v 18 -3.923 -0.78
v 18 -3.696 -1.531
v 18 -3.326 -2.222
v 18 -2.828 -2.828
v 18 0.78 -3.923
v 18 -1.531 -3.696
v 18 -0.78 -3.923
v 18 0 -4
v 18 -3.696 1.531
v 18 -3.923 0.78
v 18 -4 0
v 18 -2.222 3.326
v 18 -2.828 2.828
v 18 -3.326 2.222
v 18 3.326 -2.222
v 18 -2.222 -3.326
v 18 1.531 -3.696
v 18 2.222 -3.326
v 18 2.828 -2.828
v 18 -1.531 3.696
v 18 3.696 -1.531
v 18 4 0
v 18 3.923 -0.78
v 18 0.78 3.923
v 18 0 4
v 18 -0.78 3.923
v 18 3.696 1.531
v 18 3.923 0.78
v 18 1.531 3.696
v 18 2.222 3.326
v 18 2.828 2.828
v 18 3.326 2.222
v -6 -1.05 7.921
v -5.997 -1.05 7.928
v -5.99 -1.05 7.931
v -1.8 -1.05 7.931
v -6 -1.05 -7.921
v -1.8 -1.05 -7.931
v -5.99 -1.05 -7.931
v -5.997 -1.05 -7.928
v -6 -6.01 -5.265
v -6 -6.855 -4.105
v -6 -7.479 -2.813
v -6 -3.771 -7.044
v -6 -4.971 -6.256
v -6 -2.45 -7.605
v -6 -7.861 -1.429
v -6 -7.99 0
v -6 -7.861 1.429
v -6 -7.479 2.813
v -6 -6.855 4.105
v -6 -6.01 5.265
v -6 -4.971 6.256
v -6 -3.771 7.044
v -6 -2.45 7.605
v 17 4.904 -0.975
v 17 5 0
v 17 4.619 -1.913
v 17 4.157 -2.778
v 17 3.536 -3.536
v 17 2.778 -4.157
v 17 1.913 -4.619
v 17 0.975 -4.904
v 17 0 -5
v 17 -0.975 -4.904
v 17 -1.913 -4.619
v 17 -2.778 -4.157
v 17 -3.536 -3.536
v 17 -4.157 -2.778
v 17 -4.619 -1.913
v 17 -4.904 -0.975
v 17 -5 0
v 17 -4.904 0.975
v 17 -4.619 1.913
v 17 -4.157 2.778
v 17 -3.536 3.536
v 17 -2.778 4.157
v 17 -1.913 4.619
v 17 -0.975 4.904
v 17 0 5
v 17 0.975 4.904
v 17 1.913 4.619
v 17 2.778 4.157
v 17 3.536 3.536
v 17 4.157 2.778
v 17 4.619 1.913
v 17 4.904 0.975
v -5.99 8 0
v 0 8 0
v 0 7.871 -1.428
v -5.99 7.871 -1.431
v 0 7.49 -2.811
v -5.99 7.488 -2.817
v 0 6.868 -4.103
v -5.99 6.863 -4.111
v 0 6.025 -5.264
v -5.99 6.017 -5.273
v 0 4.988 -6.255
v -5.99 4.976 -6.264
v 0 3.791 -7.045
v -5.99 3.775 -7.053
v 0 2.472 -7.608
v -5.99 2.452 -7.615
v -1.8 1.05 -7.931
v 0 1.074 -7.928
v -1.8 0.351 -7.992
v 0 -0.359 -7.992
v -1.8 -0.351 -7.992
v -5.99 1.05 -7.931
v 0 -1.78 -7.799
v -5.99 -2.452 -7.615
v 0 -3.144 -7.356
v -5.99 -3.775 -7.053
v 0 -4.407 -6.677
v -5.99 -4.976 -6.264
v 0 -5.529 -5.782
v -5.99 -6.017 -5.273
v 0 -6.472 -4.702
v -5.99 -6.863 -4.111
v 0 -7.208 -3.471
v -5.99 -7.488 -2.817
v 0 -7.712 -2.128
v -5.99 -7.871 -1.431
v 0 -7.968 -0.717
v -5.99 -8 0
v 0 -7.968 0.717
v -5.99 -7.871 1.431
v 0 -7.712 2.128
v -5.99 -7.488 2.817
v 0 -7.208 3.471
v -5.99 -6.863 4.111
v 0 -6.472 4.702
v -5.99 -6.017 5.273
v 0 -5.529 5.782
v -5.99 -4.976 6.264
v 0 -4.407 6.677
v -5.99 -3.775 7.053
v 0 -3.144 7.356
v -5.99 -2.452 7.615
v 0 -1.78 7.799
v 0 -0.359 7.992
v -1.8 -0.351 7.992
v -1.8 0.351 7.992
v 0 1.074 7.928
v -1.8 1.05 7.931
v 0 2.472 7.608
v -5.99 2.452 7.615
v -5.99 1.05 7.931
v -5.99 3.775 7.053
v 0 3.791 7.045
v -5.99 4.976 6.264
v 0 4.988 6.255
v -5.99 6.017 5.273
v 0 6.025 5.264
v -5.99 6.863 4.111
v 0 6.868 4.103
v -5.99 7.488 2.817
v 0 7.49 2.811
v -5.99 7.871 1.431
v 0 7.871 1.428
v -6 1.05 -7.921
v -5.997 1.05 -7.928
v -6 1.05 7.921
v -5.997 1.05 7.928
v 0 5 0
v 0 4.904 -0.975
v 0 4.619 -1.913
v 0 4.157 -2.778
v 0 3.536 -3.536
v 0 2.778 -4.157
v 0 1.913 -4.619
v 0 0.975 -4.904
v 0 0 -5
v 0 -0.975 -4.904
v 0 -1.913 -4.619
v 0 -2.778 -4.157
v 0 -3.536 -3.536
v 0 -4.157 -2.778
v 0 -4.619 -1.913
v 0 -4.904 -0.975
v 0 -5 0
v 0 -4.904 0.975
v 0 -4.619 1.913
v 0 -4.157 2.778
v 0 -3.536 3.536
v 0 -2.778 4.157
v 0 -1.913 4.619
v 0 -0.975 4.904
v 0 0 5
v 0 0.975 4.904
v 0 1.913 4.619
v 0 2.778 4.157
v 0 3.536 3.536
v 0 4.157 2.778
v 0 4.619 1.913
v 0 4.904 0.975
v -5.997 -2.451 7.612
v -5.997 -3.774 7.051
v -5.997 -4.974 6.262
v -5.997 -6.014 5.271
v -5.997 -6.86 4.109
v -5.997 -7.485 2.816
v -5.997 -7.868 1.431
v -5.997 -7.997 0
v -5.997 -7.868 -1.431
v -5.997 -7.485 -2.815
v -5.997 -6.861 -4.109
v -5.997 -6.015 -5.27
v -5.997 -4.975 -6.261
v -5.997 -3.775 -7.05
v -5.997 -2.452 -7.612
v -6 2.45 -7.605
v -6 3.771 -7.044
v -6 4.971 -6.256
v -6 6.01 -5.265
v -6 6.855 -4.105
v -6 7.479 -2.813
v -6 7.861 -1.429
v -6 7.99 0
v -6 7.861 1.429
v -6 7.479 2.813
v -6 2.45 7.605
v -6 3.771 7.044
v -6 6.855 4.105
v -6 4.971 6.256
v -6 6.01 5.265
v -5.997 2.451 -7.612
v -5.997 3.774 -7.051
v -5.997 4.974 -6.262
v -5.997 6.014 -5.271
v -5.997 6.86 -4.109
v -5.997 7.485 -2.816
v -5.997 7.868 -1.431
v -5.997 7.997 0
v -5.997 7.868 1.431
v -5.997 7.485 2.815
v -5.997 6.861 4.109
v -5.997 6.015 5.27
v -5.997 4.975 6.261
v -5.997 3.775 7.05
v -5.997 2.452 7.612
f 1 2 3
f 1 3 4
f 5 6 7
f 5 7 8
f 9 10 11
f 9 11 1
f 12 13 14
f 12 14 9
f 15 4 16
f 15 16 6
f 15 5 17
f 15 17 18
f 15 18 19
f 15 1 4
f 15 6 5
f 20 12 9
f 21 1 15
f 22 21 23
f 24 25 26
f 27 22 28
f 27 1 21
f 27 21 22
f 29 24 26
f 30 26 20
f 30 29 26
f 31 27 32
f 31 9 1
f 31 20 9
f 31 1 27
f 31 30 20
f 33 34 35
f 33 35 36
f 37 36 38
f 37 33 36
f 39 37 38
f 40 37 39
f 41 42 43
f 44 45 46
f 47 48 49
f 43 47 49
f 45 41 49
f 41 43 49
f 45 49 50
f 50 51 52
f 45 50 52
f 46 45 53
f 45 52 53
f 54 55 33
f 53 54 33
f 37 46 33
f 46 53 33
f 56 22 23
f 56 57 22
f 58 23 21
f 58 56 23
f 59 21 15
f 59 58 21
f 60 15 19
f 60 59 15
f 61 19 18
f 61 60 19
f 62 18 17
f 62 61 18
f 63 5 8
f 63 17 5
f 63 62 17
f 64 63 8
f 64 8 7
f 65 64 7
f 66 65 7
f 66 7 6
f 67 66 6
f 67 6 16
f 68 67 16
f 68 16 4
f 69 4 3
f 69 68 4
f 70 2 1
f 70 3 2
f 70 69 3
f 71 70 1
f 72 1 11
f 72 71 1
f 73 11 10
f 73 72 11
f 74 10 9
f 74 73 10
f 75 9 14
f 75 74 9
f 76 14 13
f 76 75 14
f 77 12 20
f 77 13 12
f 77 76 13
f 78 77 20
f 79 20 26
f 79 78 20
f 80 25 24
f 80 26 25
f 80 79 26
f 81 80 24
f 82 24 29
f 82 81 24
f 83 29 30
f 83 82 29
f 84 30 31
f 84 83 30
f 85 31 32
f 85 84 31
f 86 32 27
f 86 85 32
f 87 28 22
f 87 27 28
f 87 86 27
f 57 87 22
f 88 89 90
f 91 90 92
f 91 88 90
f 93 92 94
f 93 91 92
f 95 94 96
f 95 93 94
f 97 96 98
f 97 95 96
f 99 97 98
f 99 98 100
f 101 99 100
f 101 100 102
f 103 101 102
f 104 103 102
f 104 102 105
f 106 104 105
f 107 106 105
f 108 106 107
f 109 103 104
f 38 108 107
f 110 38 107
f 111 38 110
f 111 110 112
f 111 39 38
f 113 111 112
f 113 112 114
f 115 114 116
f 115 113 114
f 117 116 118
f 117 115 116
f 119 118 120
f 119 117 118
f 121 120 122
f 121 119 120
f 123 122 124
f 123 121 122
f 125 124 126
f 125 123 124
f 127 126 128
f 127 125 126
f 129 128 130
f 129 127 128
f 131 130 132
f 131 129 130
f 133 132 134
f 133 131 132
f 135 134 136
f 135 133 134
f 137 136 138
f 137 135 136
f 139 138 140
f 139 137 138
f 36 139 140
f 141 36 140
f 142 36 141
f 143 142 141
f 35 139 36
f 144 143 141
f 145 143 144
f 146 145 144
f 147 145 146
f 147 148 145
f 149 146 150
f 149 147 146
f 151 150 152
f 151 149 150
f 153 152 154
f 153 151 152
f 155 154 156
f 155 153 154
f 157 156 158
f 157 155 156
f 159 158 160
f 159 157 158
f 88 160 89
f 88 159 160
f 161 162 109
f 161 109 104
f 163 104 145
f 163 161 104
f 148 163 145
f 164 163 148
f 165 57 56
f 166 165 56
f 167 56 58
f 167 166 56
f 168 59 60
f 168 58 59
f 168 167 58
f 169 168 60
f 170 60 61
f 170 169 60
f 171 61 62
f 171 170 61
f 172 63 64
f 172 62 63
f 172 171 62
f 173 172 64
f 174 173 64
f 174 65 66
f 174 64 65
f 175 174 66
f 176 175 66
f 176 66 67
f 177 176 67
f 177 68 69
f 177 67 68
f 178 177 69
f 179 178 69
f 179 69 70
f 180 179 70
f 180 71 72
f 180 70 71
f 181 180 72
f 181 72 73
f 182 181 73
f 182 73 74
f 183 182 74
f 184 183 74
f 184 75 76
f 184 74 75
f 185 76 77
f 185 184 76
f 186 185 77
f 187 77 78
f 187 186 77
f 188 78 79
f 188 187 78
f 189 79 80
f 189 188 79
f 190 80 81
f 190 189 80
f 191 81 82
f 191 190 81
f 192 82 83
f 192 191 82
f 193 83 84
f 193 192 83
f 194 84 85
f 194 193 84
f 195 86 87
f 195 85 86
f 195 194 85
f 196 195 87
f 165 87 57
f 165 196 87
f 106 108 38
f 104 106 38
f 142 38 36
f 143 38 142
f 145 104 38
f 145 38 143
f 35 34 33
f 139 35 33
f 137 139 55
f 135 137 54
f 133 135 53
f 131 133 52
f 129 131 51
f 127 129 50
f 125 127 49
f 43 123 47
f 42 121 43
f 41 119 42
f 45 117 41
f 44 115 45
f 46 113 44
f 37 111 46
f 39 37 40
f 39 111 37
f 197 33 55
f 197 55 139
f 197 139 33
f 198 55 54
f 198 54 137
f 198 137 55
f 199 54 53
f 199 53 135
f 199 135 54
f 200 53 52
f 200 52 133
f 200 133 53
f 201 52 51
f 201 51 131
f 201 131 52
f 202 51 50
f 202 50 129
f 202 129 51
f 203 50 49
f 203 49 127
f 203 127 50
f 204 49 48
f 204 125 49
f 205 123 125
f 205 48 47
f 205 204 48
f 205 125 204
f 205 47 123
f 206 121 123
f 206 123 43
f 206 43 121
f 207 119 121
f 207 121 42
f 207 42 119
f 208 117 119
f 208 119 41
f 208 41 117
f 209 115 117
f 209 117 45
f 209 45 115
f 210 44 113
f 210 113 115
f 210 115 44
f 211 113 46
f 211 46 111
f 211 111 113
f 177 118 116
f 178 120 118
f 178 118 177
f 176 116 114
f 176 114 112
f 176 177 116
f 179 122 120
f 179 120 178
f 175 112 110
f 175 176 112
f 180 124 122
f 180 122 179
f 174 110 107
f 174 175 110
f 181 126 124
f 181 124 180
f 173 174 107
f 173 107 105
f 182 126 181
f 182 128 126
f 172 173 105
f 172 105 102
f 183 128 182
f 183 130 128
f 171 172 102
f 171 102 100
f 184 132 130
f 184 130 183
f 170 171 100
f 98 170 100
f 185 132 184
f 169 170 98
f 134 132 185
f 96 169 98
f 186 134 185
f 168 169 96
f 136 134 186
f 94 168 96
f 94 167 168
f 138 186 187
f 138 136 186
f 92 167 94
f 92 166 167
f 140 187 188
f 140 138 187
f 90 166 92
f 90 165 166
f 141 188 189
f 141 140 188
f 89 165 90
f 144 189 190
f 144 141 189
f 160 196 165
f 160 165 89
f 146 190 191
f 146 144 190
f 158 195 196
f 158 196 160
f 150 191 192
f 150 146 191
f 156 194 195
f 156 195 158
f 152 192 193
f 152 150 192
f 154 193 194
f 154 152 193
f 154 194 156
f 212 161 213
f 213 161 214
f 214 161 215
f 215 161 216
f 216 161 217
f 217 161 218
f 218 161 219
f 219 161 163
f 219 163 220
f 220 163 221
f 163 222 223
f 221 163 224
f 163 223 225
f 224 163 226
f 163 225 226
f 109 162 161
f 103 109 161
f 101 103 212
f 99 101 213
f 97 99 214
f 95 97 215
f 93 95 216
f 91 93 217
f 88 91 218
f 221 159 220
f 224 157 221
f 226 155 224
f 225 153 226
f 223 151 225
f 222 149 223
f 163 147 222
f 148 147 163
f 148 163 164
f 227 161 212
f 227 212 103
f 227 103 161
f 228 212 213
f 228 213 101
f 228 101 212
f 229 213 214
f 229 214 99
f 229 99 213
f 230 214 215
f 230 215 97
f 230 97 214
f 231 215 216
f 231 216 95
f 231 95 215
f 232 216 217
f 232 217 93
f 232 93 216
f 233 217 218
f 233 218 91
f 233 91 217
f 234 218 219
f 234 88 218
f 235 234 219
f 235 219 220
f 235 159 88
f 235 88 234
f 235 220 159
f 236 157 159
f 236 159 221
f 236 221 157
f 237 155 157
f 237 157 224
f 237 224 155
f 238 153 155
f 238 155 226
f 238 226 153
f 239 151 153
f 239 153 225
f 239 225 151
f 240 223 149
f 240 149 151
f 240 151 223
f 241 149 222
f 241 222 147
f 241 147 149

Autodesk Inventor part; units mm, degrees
ref_plane "YZ Plane" through (0, 0, 0) normal (1, 0, 0) x (0, 1, 0)
ref_plane "XZ Plane" through (0, 0, 0) normal (0, 1, 0) x (-1, 0, 0)
sketch "Эскиз1" plane through (0, 0, 0) normal (0, 0, 1) x (1, 0, 0)
  line L0 (-6, 0) -> (18, 0)
  line L1 (18, 0) -> (18, 5)
  line L2 (18, 5) -> (1.5, 5)
  line L3 (1.5, 5) -> (0.5798, 5)
  line L4 (0.5798, 5) -> (0, 5)
  line L5 (0, 5) -> (0, 8)
  line L6 (-10.8, 0) -> (22.8, 0) projected
  line L7 (0, -1.6) -> (0, 9.6) projected
  line L8 (-6, 0) -> (-6, 8)
  line L9 (0, 8) -> (-6, 8)
  dimension "d0" = 18
  dimension "d1" = 16.5
  dimension "d2" = 0.9202
  dimension "d3" = 6
  dimension "d4" = 10
  dimension "d5" = 10
  dimension "d9" = 16
  dimension "d10" = 0
revolve "Базовый элемент" add sketch "Эскиз1" angle 360 about axis through (-6, 0, 0) along (1, 0, 0)
sketch "Эскиз2" plane through (-6, 0, 0) normal (-1, 0, 0) x (0, 0, 1)
  circle A0 centre (0, 0) radius 8 projected
  line L0 (0, 0) -> (0, 8) projected
  line L1 (-8, 1.05) -> (8, 1.05)
  line L2 (8, 1.05) -> (8, -1.05)
  line L3 (8, -1.05) -> (-8, -1.05)
  line L4 (-8, -1.05) -> (-8, 1.05)
  line L5 (-8, 0) -> (8, 0) construction
  line L6 (0, 1.05) -> (0, -1.05) construction
  dimension "d11" = 2.1
  dimension "d12" = 16
fillet "Сопряжение1" radius 0.01 1 edges at (-6, -8, 0)
extrude "Паз" cut sketch "Эскиз2" against normal blind 4.2 contours A0 L3 L1 | L2 L3 A0 | A0 L1 L2 | L3 L4 A0 | A0 L4 L1
thread "Резьба" size "M10x1.5" class "6g" standard "ISO Metric profile" length 16.5
chamfer "Chamfer4" distance 1 angle 45 1 edges at (18, -5, 0)
ref_plane "Work Plane1" through (30.1625, 0, 0) normal (0, 0, -1) x (1, 0, 0)
equation "\"d11\" = SBR"
equation "\"d12\" = KOD"
equation "\"d13\" = RR"
equation "\"d16\" = STI"
equation "\"d14\" = GEL"
equation "\"d40\" = 0.1 * GD"
equation "\"d0\" = NLG"
equation "\"d1\" = GEL"
equation "\"d2\" = GAL"
equation "\"d3\" = KOH"
equation "\"d4\" = GD"
equation "\"d5\" = BDM"
equation "\"d9\" = KOD"
equation "\"GD\" = NND"
equation "\"NLG\" = 18"
equation "\"GEL\" = 16.5"
equation "\"KOD\" = 16"
equation "\"KOH\" = 6"
equation "\"GAL\" = 0.61345 * PTC"
equation "\"BDM\" = NND"
equation "\"RR\" = 0.01"
equation "\"SBR\" = 2.1"
equation "\"STI\" = 4.2"
equation "\"KEWI\" = 0"
equation "\"GUL\" = 0.61345 * PTC"
equation "\"SPD\" = NND - 1.2269 * PTC"
equation "\"PTC\" = 1.5"
equation "\"TOA\" = 30deg"
equation "\"FAWI\" = 45deg"
equation "\"GD1\" = THREADDIA - 1.2269 * PTC"
equation "\"NND\" = 10"
equation "\"THREADDIA\" = 10"
properties part number "Винт M10-6gx18 ГОСТ 1491-80" material "Сталь, мягкая"
